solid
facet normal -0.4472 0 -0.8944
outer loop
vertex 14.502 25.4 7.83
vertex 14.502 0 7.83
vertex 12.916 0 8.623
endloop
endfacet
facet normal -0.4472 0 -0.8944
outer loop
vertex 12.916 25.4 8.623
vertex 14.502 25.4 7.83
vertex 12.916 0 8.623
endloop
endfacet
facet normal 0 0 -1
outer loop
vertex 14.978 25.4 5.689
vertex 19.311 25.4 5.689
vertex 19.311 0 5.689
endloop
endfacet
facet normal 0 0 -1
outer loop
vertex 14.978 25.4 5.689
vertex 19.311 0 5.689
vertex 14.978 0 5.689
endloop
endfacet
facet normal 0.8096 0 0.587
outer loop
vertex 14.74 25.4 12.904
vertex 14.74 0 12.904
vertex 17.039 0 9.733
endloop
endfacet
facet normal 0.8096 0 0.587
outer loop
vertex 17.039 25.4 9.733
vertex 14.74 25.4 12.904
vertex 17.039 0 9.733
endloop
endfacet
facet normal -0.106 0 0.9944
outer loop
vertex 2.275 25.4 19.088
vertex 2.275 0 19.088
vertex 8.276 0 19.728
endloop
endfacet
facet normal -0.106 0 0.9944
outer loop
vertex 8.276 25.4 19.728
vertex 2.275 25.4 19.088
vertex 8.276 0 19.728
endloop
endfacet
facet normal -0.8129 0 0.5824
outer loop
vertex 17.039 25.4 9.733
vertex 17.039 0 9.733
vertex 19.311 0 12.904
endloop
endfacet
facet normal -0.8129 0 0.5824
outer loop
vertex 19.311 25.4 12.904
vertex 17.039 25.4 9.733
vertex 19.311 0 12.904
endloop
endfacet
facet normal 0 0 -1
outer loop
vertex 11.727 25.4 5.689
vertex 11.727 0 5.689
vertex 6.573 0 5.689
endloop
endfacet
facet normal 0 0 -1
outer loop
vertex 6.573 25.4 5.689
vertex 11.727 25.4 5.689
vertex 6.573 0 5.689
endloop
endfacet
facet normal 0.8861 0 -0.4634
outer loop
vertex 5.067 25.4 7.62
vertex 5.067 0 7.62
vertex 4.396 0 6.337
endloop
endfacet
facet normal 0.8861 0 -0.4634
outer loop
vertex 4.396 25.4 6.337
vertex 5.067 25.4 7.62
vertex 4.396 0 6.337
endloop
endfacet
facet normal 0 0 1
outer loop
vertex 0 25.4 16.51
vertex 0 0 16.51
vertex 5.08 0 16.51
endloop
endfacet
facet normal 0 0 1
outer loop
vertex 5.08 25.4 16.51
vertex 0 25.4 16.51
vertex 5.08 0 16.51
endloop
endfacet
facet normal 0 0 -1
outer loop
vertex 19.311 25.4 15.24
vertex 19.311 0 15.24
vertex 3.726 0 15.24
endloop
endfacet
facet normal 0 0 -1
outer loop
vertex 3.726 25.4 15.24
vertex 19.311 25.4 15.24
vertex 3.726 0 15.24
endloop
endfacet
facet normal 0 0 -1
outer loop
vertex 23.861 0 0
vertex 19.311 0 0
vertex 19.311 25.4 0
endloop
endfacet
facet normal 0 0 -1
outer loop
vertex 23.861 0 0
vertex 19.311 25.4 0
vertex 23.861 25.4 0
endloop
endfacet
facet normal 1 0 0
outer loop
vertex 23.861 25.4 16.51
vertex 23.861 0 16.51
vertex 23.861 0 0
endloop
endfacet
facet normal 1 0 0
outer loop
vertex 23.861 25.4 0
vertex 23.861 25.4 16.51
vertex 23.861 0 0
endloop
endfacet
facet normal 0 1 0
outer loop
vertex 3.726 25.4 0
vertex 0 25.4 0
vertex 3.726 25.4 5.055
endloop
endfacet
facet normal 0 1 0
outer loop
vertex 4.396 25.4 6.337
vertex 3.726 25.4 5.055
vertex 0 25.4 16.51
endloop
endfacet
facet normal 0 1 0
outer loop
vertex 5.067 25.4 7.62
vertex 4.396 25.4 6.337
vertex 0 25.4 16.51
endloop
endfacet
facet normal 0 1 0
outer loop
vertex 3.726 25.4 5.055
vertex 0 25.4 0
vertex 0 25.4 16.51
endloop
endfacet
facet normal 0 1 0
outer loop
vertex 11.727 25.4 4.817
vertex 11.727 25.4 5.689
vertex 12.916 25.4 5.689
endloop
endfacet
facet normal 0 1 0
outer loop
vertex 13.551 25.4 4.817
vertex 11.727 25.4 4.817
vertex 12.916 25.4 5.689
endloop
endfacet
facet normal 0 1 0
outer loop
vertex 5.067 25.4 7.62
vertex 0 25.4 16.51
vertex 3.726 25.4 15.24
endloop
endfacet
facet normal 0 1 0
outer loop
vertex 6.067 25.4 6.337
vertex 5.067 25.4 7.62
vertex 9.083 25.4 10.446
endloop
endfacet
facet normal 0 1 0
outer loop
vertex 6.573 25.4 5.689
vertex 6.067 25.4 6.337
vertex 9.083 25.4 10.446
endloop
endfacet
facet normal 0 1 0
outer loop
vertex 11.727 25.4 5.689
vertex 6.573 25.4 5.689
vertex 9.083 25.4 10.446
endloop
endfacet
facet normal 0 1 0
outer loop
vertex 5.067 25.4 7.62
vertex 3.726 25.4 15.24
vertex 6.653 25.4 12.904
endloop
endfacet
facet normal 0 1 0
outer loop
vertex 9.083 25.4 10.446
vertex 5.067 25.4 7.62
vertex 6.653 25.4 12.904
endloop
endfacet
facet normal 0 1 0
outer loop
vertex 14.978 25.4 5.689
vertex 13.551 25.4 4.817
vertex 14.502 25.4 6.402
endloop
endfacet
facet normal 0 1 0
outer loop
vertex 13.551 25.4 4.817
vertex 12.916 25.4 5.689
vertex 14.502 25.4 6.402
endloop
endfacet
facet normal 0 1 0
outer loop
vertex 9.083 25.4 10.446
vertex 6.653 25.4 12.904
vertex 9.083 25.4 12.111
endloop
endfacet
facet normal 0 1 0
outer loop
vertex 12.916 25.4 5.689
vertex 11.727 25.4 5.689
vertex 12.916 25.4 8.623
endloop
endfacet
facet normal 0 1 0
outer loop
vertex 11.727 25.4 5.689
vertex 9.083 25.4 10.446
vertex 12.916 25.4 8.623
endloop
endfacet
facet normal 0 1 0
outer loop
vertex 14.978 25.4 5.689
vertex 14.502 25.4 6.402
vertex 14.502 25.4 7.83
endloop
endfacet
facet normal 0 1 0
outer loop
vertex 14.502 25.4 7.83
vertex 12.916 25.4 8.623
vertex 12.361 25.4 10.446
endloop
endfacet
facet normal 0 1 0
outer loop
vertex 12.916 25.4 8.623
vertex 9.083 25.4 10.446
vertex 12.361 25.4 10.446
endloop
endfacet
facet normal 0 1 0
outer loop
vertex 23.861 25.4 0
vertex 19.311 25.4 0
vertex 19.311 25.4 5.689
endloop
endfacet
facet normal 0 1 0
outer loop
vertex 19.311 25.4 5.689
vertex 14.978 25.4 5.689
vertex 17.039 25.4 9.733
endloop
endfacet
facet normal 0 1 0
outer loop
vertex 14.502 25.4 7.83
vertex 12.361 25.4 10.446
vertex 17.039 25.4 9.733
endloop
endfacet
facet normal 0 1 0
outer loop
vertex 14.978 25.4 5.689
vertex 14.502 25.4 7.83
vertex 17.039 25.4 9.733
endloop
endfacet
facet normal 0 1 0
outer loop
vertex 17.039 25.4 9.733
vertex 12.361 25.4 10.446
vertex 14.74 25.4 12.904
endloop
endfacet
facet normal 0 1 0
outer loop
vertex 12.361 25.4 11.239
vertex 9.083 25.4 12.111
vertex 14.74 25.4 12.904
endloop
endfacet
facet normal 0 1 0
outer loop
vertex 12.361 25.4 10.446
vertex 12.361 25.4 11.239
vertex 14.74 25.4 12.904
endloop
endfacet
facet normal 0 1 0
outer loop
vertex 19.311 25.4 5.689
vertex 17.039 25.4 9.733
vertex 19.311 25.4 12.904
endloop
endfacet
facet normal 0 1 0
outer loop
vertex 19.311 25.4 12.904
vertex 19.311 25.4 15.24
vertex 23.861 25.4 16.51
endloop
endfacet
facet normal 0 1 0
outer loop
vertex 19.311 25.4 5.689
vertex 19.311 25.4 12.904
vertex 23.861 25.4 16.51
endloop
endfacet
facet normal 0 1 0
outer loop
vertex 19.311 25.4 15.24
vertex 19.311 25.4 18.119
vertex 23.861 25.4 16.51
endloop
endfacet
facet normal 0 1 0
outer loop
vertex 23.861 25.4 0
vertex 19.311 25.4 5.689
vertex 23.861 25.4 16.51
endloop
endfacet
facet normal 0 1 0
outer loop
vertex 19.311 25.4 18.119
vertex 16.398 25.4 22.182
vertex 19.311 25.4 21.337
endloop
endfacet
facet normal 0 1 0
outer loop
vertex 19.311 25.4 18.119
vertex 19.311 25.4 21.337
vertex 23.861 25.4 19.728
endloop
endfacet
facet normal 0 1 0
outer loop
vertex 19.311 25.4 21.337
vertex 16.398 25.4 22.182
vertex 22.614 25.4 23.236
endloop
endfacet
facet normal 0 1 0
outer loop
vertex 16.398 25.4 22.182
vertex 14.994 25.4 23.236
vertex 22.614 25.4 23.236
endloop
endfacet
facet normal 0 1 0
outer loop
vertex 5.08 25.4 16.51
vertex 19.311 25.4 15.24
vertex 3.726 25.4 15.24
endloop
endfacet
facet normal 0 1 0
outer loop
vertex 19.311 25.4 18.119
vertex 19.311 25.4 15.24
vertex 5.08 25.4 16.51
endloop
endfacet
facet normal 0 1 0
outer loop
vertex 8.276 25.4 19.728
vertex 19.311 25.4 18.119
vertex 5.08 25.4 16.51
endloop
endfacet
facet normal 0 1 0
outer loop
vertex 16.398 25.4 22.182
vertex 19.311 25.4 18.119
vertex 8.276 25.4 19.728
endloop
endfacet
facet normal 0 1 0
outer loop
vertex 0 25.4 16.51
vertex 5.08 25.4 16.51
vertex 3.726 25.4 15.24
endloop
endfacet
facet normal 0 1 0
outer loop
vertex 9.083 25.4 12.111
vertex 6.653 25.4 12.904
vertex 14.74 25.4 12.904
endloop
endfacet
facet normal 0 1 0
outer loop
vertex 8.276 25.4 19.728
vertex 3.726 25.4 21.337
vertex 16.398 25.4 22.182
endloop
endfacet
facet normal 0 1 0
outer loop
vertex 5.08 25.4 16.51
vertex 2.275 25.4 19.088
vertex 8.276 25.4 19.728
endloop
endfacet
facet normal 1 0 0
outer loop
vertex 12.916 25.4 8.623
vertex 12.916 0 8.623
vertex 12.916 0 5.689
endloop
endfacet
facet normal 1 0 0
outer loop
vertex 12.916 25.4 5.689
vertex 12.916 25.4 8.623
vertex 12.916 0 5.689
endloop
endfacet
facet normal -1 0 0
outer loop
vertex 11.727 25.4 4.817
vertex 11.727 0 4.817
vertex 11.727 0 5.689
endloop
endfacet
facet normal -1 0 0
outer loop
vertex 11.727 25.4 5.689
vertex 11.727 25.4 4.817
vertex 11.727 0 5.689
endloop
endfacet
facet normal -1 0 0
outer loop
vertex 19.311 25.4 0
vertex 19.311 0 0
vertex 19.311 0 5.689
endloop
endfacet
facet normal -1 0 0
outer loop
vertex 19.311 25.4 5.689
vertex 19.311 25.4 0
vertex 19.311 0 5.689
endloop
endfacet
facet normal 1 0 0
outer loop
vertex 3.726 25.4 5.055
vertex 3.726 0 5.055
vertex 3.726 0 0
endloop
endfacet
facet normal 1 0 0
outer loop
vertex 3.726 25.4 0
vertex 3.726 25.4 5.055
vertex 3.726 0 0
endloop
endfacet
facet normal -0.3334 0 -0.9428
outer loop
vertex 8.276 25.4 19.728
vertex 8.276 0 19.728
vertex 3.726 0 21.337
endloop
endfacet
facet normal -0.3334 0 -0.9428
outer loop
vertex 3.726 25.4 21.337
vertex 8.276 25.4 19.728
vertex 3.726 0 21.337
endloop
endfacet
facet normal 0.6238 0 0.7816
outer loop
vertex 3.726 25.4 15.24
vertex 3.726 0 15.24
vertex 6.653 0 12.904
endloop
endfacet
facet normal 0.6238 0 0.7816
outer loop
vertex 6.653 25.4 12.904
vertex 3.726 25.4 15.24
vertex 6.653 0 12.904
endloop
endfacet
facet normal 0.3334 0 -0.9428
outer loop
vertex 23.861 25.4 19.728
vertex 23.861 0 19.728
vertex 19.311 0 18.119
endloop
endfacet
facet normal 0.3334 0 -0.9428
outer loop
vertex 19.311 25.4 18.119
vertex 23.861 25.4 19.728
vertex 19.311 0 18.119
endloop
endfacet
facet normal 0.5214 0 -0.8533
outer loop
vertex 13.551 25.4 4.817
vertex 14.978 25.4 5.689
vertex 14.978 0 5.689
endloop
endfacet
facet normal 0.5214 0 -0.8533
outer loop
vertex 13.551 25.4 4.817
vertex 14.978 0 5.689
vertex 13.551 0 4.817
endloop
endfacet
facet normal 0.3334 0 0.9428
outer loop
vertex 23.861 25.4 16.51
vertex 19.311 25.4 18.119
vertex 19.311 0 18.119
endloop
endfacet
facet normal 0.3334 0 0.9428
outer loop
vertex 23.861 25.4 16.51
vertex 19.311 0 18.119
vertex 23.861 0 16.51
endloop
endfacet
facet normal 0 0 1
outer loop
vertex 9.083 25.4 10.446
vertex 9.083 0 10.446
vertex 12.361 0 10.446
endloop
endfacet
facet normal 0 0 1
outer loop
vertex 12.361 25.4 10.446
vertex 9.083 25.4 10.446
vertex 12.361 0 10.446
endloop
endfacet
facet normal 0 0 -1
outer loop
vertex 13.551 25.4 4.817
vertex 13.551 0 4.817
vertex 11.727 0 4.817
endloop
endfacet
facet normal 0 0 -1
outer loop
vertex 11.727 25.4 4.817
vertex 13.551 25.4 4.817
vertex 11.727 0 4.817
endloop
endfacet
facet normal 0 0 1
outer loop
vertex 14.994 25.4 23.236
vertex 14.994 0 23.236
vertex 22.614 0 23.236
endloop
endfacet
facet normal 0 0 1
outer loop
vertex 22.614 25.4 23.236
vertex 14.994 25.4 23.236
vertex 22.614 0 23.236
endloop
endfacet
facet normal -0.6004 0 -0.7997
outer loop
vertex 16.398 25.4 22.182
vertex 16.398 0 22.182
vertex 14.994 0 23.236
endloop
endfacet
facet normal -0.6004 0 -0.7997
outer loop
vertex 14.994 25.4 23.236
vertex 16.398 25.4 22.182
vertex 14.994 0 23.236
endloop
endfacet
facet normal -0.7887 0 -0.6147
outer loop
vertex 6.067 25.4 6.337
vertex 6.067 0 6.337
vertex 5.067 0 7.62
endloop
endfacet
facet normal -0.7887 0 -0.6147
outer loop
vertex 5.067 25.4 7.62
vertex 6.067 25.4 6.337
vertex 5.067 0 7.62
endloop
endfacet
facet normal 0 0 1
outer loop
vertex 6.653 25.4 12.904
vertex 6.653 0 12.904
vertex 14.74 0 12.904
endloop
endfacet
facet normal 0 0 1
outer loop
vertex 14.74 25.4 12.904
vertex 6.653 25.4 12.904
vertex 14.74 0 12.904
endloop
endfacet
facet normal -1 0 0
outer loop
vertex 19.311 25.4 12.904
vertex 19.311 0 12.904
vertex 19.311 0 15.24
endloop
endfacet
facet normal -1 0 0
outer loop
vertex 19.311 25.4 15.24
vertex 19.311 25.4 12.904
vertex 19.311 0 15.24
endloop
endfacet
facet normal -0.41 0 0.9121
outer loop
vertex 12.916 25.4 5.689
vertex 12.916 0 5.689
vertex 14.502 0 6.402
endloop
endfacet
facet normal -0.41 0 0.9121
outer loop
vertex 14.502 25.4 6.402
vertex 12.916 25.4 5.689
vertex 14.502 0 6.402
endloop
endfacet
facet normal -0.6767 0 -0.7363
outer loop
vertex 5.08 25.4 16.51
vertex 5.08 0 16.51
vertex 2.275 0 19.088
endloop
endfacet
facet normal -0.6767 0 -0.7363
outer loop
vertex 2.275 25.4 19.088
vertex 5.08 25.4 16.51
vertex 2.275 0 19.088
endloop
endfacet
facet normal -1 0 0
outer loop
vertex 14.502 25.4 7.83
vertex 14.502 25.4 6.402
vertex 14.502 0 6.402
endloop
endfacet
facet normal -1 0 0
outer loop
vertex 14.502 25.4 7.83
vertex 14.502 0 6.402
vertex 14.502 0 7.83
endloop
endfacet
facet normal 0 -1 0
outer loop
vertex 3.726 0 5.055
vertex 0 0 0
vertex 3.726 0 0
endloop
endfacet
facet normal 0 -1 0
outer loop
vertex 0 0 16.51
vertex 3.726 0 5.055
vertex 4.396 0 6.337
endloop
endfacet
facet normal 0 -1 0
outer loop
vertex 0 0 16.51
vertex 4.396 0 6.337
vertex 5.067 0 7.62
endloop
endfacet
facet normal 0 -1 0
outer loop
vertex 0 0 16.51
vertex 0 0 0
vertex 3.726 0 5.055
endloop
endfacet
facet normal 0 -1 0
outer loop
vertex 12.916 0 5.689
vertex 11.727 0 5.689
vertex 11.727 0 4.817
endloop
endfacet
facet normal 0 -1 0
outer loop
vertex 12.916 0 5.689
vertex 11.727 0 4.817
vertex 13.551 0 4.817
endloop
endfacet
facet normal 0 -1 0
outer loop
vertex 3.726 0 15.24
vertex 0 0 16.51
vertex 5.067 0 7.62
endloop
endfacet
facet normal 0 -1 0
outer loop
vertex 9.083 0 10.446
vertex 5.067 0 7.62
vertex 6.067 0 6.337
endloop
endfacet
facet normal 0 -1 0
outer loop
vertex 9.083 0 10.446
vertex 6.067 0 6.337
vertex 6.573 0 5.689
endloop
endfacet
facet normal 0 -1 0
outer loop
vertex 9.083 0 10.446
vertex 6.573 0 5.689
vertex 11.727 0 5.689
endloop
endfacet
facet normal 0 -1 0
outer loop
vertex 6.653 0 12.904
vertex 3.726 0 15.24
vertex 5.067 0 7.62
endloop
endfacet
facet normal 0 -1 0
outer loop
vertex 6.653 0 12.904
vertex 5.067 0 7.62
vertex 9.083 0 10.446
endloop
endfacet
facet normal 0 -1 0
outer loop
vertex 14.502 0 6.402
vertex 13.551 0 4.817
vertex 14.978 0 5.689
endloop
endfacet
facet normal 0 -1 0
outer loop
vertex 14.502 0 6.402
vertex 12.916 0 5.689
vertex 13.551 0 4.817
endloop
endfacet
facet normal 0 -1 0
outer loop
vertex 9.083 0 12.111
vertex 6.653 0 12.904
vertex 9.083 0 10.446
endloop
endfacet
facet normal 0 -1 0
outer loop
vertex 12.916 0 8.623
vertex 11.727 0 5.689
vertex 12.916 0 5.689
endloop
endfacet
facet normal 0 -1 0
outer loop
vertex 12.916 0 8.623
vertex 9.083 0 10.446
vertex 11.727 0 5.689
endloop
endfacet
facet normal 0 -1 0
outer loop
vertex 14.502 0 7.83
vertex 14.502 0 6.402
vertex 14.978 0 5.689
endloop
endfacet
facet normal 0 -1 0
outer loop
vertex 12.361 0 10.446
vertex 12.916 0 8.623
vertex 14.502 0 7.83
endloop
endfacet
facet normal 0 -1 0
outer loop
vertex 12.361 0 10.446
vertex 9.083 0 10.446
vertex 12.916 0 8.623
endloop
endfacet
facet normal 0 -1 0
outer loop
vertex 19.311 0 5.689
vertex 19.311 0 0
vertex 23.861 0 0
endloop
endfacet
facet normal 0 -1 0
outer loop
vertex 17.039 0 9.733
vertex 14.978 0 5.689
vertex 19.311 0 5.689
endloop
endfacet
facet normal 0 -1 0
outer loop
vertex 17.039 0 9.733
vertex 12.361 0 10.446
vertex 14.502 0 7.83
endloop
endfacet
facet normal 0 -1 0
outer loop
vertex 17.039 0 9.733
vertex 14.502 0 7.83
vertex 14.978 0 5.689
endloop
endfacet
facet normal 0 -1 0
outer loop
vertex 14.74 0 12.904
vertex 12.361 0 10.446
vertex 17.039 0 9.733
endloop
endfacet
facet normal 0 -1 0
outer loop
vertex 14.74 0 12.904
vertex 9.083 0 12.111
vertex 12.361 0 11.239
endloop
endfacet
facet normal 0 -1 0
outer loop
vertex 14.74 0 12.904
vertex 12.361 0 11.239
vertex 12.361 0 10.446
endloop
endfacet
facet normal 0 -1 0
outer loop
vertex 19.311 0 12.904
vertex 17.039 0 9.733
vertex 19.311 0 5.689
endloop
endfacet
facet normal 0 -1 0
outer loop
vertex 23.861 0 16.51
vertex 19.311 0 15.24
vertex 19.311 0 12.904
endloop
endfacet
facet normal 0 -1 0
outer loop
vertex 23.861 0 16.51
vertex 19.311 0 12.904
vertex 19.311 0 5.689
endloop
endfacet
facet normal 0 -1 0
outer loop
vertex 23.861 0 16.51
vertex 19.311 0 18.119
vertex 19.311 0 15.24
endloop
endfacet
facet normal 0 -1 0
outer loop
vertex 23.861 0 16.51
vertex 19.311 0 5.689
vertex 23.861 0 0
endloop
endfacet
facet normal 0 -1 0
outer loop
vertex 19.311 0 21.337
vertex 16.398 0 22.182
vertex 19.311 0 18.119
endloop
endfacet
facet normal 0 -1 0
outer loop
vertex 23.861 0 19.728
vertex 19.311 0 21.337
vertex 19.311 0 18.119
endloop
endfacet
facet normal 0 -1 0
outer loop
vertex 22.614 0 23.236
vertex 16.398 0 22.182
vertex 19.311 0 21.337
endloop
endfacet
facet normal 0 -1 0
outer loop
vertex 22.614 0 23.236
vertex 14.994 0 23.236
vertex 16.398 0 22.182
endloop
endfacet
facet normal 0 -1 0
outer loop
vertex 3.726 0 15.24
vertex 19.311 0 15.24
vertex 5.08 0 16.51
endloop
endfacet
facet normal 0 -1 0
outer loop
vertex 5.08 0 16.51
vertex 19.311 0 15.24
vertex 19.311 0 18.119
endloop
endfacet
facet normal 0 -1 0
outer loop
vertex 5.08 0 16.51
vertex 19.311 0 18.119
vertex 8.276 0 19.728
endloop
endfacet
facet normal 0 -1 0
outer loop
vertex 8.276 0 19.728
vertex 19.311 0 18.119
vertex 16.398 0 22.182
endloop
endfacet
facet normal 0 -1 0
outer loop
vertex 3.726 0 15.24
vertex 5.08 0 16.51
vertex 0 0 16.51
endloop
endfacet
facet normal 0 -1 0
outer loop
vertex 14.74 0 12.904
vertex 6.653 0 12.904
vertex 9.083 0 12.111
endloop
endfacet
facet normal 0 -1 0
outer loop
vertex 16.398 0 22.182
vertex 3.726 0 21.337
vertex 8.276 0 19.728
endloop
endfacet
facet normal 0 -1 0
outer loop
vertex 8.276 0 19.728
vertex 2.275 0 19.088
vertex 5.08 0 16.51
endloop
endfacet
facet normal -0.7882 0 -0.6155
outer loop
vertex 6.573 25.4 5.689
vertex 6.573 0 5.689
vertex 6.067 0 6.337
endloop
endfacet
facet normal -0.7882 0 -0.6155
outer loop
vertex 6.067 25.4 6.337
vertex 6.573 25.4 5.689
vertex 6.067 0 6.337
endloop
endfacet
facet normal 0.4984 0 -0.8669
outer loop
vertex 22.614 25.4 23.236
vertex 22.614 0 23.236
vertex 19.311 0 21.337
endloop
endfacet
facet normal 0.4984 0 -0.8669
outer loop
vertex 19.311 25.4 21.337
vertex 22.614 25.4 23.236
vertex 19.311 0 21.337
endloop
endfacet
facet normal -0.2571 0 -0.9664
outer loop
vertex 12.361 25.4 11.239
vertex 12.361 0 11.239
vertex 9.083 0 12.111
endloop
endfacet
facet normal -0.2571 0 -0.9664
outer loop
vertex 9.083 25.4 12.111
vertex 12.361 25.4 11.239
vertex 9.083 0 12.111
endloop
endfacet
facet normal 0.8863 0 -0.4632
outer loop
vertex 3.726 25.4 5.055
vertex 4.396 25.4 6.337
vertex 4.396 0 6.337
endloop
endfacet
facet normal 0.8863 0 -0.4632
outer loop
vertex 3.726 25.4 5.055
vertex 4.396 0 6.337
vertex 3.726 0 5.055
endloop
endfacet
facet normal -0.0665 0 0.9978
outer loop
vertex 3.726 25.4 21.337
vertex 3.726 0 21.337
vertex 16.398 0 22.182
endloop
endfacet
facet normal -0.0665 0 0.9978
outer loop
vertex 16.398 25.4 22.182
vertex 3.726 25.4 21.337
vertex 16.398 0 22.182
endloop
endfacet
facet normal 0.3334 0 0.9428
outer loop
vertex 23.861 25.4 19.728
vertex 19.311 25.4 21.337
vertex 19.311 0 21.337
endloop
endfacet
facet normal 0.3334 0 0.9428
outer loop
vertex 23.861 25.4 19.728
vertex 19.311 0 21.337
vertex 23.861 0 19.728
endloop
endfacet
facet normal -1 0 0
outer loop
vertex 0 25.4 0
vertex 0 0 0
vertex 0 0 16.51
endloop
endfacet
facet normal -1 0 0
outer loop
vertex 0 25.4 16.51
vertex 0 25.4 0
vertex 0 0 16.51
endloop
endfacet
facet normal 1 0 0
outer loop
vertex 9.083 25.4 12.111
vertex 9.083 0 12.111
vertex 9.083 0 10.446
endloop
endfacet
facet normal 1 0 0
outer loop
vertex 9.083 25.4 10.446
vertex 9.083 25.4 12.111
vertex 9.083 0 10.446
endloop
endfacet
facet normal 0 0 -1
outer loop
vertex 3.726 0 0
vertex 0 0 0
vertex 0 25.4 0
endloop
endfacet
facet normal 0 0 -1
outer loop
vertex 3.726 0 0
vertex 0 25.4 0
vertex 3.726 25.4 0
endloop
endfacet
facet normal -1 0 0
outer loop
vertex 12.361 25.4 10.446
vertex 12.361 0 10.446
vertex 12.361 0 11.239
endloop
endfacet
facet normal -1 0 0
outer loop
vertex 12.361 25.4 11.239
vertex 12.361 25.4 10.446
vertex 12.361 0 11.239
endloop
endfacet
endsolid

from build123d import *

# Parameters (mm, degrees)
F0_W     = 25.4
F0_H     = 25.4
F2_DEPTH = 25.4
F3_DEPTH = 25.4


with BuildPart() as f2:
    # F0 (on Front) → F2 (new body)
    with BuildSketch(Plane.XZ):
        with Locations((12.7, 12.7)):
            Rectangle(F0_W, F0_H)
    extrude(amount=-F2_DEPTH)

    # F1 (on face) → F3 (cut)
    with BuildSketch(Plane.XZ):
        Polygon((0, 25.4), (0, 16.51), (5.08, 16.51), (2.274592, 19.087943), (8.275861, 19.728145), (3.726008, 21.337217), (16.39788, 22.182008), (14.994388, 23.235855), (22.614388, 23.235855), (19.311167, 21.337217), (23.86102, 19.728145), (19.311167, 18.119072), (23.86102, 16.51), (23.86102, 0), (25.4, 0), (25.4, 25.4), align=None)
        Polygon((9.083407, 15.24), (3.726008, 15.24), (6.652538, 12.90414), (9.083407, 12.90414), (12.361358, 12.90414), (14.740032, 12.90414), (16.960129, 11.318357), (19.311167, 12.90414), (19.311167, 15.24), align=None)
        Polygon((3.726008, 5.054513), (3.726008, 0), (19.311167, 0), (19.311167, 5.688827), (14.977898, 5.688827), (13.550695, 4.816646), (11.727044, 4.816646), (11.727044, 5.688827), (9.189791, 5.688827), (6.573249, 5.688827), (6.067413, 6.337257), (4.396382, 6.337257), align=None)
        Polygon((12.916381, 8.622526), (12.916381, 5.688827), (14.502165, 6.402429), (14.502165, 7.829634), align=None)
        Polygon((12.361358, 11.239068), (9.083407, 12.111248), (9.083407, 10.446176), (12.361358, 10.446176), align=None)
        Polygon((17.039418, 9.732574), (19.311167, 12.90414), (16.960129, 11.318357), (14.740032, 12.90414), align=None)
        Polygon((5.066755, 7.62), (4.396382, 6.337257), (6.067413, 6.337257), align=None)
    extrude(amount=-F3_DEPTH, mode=Mode.SUBTRACT)


solid = f2.part
